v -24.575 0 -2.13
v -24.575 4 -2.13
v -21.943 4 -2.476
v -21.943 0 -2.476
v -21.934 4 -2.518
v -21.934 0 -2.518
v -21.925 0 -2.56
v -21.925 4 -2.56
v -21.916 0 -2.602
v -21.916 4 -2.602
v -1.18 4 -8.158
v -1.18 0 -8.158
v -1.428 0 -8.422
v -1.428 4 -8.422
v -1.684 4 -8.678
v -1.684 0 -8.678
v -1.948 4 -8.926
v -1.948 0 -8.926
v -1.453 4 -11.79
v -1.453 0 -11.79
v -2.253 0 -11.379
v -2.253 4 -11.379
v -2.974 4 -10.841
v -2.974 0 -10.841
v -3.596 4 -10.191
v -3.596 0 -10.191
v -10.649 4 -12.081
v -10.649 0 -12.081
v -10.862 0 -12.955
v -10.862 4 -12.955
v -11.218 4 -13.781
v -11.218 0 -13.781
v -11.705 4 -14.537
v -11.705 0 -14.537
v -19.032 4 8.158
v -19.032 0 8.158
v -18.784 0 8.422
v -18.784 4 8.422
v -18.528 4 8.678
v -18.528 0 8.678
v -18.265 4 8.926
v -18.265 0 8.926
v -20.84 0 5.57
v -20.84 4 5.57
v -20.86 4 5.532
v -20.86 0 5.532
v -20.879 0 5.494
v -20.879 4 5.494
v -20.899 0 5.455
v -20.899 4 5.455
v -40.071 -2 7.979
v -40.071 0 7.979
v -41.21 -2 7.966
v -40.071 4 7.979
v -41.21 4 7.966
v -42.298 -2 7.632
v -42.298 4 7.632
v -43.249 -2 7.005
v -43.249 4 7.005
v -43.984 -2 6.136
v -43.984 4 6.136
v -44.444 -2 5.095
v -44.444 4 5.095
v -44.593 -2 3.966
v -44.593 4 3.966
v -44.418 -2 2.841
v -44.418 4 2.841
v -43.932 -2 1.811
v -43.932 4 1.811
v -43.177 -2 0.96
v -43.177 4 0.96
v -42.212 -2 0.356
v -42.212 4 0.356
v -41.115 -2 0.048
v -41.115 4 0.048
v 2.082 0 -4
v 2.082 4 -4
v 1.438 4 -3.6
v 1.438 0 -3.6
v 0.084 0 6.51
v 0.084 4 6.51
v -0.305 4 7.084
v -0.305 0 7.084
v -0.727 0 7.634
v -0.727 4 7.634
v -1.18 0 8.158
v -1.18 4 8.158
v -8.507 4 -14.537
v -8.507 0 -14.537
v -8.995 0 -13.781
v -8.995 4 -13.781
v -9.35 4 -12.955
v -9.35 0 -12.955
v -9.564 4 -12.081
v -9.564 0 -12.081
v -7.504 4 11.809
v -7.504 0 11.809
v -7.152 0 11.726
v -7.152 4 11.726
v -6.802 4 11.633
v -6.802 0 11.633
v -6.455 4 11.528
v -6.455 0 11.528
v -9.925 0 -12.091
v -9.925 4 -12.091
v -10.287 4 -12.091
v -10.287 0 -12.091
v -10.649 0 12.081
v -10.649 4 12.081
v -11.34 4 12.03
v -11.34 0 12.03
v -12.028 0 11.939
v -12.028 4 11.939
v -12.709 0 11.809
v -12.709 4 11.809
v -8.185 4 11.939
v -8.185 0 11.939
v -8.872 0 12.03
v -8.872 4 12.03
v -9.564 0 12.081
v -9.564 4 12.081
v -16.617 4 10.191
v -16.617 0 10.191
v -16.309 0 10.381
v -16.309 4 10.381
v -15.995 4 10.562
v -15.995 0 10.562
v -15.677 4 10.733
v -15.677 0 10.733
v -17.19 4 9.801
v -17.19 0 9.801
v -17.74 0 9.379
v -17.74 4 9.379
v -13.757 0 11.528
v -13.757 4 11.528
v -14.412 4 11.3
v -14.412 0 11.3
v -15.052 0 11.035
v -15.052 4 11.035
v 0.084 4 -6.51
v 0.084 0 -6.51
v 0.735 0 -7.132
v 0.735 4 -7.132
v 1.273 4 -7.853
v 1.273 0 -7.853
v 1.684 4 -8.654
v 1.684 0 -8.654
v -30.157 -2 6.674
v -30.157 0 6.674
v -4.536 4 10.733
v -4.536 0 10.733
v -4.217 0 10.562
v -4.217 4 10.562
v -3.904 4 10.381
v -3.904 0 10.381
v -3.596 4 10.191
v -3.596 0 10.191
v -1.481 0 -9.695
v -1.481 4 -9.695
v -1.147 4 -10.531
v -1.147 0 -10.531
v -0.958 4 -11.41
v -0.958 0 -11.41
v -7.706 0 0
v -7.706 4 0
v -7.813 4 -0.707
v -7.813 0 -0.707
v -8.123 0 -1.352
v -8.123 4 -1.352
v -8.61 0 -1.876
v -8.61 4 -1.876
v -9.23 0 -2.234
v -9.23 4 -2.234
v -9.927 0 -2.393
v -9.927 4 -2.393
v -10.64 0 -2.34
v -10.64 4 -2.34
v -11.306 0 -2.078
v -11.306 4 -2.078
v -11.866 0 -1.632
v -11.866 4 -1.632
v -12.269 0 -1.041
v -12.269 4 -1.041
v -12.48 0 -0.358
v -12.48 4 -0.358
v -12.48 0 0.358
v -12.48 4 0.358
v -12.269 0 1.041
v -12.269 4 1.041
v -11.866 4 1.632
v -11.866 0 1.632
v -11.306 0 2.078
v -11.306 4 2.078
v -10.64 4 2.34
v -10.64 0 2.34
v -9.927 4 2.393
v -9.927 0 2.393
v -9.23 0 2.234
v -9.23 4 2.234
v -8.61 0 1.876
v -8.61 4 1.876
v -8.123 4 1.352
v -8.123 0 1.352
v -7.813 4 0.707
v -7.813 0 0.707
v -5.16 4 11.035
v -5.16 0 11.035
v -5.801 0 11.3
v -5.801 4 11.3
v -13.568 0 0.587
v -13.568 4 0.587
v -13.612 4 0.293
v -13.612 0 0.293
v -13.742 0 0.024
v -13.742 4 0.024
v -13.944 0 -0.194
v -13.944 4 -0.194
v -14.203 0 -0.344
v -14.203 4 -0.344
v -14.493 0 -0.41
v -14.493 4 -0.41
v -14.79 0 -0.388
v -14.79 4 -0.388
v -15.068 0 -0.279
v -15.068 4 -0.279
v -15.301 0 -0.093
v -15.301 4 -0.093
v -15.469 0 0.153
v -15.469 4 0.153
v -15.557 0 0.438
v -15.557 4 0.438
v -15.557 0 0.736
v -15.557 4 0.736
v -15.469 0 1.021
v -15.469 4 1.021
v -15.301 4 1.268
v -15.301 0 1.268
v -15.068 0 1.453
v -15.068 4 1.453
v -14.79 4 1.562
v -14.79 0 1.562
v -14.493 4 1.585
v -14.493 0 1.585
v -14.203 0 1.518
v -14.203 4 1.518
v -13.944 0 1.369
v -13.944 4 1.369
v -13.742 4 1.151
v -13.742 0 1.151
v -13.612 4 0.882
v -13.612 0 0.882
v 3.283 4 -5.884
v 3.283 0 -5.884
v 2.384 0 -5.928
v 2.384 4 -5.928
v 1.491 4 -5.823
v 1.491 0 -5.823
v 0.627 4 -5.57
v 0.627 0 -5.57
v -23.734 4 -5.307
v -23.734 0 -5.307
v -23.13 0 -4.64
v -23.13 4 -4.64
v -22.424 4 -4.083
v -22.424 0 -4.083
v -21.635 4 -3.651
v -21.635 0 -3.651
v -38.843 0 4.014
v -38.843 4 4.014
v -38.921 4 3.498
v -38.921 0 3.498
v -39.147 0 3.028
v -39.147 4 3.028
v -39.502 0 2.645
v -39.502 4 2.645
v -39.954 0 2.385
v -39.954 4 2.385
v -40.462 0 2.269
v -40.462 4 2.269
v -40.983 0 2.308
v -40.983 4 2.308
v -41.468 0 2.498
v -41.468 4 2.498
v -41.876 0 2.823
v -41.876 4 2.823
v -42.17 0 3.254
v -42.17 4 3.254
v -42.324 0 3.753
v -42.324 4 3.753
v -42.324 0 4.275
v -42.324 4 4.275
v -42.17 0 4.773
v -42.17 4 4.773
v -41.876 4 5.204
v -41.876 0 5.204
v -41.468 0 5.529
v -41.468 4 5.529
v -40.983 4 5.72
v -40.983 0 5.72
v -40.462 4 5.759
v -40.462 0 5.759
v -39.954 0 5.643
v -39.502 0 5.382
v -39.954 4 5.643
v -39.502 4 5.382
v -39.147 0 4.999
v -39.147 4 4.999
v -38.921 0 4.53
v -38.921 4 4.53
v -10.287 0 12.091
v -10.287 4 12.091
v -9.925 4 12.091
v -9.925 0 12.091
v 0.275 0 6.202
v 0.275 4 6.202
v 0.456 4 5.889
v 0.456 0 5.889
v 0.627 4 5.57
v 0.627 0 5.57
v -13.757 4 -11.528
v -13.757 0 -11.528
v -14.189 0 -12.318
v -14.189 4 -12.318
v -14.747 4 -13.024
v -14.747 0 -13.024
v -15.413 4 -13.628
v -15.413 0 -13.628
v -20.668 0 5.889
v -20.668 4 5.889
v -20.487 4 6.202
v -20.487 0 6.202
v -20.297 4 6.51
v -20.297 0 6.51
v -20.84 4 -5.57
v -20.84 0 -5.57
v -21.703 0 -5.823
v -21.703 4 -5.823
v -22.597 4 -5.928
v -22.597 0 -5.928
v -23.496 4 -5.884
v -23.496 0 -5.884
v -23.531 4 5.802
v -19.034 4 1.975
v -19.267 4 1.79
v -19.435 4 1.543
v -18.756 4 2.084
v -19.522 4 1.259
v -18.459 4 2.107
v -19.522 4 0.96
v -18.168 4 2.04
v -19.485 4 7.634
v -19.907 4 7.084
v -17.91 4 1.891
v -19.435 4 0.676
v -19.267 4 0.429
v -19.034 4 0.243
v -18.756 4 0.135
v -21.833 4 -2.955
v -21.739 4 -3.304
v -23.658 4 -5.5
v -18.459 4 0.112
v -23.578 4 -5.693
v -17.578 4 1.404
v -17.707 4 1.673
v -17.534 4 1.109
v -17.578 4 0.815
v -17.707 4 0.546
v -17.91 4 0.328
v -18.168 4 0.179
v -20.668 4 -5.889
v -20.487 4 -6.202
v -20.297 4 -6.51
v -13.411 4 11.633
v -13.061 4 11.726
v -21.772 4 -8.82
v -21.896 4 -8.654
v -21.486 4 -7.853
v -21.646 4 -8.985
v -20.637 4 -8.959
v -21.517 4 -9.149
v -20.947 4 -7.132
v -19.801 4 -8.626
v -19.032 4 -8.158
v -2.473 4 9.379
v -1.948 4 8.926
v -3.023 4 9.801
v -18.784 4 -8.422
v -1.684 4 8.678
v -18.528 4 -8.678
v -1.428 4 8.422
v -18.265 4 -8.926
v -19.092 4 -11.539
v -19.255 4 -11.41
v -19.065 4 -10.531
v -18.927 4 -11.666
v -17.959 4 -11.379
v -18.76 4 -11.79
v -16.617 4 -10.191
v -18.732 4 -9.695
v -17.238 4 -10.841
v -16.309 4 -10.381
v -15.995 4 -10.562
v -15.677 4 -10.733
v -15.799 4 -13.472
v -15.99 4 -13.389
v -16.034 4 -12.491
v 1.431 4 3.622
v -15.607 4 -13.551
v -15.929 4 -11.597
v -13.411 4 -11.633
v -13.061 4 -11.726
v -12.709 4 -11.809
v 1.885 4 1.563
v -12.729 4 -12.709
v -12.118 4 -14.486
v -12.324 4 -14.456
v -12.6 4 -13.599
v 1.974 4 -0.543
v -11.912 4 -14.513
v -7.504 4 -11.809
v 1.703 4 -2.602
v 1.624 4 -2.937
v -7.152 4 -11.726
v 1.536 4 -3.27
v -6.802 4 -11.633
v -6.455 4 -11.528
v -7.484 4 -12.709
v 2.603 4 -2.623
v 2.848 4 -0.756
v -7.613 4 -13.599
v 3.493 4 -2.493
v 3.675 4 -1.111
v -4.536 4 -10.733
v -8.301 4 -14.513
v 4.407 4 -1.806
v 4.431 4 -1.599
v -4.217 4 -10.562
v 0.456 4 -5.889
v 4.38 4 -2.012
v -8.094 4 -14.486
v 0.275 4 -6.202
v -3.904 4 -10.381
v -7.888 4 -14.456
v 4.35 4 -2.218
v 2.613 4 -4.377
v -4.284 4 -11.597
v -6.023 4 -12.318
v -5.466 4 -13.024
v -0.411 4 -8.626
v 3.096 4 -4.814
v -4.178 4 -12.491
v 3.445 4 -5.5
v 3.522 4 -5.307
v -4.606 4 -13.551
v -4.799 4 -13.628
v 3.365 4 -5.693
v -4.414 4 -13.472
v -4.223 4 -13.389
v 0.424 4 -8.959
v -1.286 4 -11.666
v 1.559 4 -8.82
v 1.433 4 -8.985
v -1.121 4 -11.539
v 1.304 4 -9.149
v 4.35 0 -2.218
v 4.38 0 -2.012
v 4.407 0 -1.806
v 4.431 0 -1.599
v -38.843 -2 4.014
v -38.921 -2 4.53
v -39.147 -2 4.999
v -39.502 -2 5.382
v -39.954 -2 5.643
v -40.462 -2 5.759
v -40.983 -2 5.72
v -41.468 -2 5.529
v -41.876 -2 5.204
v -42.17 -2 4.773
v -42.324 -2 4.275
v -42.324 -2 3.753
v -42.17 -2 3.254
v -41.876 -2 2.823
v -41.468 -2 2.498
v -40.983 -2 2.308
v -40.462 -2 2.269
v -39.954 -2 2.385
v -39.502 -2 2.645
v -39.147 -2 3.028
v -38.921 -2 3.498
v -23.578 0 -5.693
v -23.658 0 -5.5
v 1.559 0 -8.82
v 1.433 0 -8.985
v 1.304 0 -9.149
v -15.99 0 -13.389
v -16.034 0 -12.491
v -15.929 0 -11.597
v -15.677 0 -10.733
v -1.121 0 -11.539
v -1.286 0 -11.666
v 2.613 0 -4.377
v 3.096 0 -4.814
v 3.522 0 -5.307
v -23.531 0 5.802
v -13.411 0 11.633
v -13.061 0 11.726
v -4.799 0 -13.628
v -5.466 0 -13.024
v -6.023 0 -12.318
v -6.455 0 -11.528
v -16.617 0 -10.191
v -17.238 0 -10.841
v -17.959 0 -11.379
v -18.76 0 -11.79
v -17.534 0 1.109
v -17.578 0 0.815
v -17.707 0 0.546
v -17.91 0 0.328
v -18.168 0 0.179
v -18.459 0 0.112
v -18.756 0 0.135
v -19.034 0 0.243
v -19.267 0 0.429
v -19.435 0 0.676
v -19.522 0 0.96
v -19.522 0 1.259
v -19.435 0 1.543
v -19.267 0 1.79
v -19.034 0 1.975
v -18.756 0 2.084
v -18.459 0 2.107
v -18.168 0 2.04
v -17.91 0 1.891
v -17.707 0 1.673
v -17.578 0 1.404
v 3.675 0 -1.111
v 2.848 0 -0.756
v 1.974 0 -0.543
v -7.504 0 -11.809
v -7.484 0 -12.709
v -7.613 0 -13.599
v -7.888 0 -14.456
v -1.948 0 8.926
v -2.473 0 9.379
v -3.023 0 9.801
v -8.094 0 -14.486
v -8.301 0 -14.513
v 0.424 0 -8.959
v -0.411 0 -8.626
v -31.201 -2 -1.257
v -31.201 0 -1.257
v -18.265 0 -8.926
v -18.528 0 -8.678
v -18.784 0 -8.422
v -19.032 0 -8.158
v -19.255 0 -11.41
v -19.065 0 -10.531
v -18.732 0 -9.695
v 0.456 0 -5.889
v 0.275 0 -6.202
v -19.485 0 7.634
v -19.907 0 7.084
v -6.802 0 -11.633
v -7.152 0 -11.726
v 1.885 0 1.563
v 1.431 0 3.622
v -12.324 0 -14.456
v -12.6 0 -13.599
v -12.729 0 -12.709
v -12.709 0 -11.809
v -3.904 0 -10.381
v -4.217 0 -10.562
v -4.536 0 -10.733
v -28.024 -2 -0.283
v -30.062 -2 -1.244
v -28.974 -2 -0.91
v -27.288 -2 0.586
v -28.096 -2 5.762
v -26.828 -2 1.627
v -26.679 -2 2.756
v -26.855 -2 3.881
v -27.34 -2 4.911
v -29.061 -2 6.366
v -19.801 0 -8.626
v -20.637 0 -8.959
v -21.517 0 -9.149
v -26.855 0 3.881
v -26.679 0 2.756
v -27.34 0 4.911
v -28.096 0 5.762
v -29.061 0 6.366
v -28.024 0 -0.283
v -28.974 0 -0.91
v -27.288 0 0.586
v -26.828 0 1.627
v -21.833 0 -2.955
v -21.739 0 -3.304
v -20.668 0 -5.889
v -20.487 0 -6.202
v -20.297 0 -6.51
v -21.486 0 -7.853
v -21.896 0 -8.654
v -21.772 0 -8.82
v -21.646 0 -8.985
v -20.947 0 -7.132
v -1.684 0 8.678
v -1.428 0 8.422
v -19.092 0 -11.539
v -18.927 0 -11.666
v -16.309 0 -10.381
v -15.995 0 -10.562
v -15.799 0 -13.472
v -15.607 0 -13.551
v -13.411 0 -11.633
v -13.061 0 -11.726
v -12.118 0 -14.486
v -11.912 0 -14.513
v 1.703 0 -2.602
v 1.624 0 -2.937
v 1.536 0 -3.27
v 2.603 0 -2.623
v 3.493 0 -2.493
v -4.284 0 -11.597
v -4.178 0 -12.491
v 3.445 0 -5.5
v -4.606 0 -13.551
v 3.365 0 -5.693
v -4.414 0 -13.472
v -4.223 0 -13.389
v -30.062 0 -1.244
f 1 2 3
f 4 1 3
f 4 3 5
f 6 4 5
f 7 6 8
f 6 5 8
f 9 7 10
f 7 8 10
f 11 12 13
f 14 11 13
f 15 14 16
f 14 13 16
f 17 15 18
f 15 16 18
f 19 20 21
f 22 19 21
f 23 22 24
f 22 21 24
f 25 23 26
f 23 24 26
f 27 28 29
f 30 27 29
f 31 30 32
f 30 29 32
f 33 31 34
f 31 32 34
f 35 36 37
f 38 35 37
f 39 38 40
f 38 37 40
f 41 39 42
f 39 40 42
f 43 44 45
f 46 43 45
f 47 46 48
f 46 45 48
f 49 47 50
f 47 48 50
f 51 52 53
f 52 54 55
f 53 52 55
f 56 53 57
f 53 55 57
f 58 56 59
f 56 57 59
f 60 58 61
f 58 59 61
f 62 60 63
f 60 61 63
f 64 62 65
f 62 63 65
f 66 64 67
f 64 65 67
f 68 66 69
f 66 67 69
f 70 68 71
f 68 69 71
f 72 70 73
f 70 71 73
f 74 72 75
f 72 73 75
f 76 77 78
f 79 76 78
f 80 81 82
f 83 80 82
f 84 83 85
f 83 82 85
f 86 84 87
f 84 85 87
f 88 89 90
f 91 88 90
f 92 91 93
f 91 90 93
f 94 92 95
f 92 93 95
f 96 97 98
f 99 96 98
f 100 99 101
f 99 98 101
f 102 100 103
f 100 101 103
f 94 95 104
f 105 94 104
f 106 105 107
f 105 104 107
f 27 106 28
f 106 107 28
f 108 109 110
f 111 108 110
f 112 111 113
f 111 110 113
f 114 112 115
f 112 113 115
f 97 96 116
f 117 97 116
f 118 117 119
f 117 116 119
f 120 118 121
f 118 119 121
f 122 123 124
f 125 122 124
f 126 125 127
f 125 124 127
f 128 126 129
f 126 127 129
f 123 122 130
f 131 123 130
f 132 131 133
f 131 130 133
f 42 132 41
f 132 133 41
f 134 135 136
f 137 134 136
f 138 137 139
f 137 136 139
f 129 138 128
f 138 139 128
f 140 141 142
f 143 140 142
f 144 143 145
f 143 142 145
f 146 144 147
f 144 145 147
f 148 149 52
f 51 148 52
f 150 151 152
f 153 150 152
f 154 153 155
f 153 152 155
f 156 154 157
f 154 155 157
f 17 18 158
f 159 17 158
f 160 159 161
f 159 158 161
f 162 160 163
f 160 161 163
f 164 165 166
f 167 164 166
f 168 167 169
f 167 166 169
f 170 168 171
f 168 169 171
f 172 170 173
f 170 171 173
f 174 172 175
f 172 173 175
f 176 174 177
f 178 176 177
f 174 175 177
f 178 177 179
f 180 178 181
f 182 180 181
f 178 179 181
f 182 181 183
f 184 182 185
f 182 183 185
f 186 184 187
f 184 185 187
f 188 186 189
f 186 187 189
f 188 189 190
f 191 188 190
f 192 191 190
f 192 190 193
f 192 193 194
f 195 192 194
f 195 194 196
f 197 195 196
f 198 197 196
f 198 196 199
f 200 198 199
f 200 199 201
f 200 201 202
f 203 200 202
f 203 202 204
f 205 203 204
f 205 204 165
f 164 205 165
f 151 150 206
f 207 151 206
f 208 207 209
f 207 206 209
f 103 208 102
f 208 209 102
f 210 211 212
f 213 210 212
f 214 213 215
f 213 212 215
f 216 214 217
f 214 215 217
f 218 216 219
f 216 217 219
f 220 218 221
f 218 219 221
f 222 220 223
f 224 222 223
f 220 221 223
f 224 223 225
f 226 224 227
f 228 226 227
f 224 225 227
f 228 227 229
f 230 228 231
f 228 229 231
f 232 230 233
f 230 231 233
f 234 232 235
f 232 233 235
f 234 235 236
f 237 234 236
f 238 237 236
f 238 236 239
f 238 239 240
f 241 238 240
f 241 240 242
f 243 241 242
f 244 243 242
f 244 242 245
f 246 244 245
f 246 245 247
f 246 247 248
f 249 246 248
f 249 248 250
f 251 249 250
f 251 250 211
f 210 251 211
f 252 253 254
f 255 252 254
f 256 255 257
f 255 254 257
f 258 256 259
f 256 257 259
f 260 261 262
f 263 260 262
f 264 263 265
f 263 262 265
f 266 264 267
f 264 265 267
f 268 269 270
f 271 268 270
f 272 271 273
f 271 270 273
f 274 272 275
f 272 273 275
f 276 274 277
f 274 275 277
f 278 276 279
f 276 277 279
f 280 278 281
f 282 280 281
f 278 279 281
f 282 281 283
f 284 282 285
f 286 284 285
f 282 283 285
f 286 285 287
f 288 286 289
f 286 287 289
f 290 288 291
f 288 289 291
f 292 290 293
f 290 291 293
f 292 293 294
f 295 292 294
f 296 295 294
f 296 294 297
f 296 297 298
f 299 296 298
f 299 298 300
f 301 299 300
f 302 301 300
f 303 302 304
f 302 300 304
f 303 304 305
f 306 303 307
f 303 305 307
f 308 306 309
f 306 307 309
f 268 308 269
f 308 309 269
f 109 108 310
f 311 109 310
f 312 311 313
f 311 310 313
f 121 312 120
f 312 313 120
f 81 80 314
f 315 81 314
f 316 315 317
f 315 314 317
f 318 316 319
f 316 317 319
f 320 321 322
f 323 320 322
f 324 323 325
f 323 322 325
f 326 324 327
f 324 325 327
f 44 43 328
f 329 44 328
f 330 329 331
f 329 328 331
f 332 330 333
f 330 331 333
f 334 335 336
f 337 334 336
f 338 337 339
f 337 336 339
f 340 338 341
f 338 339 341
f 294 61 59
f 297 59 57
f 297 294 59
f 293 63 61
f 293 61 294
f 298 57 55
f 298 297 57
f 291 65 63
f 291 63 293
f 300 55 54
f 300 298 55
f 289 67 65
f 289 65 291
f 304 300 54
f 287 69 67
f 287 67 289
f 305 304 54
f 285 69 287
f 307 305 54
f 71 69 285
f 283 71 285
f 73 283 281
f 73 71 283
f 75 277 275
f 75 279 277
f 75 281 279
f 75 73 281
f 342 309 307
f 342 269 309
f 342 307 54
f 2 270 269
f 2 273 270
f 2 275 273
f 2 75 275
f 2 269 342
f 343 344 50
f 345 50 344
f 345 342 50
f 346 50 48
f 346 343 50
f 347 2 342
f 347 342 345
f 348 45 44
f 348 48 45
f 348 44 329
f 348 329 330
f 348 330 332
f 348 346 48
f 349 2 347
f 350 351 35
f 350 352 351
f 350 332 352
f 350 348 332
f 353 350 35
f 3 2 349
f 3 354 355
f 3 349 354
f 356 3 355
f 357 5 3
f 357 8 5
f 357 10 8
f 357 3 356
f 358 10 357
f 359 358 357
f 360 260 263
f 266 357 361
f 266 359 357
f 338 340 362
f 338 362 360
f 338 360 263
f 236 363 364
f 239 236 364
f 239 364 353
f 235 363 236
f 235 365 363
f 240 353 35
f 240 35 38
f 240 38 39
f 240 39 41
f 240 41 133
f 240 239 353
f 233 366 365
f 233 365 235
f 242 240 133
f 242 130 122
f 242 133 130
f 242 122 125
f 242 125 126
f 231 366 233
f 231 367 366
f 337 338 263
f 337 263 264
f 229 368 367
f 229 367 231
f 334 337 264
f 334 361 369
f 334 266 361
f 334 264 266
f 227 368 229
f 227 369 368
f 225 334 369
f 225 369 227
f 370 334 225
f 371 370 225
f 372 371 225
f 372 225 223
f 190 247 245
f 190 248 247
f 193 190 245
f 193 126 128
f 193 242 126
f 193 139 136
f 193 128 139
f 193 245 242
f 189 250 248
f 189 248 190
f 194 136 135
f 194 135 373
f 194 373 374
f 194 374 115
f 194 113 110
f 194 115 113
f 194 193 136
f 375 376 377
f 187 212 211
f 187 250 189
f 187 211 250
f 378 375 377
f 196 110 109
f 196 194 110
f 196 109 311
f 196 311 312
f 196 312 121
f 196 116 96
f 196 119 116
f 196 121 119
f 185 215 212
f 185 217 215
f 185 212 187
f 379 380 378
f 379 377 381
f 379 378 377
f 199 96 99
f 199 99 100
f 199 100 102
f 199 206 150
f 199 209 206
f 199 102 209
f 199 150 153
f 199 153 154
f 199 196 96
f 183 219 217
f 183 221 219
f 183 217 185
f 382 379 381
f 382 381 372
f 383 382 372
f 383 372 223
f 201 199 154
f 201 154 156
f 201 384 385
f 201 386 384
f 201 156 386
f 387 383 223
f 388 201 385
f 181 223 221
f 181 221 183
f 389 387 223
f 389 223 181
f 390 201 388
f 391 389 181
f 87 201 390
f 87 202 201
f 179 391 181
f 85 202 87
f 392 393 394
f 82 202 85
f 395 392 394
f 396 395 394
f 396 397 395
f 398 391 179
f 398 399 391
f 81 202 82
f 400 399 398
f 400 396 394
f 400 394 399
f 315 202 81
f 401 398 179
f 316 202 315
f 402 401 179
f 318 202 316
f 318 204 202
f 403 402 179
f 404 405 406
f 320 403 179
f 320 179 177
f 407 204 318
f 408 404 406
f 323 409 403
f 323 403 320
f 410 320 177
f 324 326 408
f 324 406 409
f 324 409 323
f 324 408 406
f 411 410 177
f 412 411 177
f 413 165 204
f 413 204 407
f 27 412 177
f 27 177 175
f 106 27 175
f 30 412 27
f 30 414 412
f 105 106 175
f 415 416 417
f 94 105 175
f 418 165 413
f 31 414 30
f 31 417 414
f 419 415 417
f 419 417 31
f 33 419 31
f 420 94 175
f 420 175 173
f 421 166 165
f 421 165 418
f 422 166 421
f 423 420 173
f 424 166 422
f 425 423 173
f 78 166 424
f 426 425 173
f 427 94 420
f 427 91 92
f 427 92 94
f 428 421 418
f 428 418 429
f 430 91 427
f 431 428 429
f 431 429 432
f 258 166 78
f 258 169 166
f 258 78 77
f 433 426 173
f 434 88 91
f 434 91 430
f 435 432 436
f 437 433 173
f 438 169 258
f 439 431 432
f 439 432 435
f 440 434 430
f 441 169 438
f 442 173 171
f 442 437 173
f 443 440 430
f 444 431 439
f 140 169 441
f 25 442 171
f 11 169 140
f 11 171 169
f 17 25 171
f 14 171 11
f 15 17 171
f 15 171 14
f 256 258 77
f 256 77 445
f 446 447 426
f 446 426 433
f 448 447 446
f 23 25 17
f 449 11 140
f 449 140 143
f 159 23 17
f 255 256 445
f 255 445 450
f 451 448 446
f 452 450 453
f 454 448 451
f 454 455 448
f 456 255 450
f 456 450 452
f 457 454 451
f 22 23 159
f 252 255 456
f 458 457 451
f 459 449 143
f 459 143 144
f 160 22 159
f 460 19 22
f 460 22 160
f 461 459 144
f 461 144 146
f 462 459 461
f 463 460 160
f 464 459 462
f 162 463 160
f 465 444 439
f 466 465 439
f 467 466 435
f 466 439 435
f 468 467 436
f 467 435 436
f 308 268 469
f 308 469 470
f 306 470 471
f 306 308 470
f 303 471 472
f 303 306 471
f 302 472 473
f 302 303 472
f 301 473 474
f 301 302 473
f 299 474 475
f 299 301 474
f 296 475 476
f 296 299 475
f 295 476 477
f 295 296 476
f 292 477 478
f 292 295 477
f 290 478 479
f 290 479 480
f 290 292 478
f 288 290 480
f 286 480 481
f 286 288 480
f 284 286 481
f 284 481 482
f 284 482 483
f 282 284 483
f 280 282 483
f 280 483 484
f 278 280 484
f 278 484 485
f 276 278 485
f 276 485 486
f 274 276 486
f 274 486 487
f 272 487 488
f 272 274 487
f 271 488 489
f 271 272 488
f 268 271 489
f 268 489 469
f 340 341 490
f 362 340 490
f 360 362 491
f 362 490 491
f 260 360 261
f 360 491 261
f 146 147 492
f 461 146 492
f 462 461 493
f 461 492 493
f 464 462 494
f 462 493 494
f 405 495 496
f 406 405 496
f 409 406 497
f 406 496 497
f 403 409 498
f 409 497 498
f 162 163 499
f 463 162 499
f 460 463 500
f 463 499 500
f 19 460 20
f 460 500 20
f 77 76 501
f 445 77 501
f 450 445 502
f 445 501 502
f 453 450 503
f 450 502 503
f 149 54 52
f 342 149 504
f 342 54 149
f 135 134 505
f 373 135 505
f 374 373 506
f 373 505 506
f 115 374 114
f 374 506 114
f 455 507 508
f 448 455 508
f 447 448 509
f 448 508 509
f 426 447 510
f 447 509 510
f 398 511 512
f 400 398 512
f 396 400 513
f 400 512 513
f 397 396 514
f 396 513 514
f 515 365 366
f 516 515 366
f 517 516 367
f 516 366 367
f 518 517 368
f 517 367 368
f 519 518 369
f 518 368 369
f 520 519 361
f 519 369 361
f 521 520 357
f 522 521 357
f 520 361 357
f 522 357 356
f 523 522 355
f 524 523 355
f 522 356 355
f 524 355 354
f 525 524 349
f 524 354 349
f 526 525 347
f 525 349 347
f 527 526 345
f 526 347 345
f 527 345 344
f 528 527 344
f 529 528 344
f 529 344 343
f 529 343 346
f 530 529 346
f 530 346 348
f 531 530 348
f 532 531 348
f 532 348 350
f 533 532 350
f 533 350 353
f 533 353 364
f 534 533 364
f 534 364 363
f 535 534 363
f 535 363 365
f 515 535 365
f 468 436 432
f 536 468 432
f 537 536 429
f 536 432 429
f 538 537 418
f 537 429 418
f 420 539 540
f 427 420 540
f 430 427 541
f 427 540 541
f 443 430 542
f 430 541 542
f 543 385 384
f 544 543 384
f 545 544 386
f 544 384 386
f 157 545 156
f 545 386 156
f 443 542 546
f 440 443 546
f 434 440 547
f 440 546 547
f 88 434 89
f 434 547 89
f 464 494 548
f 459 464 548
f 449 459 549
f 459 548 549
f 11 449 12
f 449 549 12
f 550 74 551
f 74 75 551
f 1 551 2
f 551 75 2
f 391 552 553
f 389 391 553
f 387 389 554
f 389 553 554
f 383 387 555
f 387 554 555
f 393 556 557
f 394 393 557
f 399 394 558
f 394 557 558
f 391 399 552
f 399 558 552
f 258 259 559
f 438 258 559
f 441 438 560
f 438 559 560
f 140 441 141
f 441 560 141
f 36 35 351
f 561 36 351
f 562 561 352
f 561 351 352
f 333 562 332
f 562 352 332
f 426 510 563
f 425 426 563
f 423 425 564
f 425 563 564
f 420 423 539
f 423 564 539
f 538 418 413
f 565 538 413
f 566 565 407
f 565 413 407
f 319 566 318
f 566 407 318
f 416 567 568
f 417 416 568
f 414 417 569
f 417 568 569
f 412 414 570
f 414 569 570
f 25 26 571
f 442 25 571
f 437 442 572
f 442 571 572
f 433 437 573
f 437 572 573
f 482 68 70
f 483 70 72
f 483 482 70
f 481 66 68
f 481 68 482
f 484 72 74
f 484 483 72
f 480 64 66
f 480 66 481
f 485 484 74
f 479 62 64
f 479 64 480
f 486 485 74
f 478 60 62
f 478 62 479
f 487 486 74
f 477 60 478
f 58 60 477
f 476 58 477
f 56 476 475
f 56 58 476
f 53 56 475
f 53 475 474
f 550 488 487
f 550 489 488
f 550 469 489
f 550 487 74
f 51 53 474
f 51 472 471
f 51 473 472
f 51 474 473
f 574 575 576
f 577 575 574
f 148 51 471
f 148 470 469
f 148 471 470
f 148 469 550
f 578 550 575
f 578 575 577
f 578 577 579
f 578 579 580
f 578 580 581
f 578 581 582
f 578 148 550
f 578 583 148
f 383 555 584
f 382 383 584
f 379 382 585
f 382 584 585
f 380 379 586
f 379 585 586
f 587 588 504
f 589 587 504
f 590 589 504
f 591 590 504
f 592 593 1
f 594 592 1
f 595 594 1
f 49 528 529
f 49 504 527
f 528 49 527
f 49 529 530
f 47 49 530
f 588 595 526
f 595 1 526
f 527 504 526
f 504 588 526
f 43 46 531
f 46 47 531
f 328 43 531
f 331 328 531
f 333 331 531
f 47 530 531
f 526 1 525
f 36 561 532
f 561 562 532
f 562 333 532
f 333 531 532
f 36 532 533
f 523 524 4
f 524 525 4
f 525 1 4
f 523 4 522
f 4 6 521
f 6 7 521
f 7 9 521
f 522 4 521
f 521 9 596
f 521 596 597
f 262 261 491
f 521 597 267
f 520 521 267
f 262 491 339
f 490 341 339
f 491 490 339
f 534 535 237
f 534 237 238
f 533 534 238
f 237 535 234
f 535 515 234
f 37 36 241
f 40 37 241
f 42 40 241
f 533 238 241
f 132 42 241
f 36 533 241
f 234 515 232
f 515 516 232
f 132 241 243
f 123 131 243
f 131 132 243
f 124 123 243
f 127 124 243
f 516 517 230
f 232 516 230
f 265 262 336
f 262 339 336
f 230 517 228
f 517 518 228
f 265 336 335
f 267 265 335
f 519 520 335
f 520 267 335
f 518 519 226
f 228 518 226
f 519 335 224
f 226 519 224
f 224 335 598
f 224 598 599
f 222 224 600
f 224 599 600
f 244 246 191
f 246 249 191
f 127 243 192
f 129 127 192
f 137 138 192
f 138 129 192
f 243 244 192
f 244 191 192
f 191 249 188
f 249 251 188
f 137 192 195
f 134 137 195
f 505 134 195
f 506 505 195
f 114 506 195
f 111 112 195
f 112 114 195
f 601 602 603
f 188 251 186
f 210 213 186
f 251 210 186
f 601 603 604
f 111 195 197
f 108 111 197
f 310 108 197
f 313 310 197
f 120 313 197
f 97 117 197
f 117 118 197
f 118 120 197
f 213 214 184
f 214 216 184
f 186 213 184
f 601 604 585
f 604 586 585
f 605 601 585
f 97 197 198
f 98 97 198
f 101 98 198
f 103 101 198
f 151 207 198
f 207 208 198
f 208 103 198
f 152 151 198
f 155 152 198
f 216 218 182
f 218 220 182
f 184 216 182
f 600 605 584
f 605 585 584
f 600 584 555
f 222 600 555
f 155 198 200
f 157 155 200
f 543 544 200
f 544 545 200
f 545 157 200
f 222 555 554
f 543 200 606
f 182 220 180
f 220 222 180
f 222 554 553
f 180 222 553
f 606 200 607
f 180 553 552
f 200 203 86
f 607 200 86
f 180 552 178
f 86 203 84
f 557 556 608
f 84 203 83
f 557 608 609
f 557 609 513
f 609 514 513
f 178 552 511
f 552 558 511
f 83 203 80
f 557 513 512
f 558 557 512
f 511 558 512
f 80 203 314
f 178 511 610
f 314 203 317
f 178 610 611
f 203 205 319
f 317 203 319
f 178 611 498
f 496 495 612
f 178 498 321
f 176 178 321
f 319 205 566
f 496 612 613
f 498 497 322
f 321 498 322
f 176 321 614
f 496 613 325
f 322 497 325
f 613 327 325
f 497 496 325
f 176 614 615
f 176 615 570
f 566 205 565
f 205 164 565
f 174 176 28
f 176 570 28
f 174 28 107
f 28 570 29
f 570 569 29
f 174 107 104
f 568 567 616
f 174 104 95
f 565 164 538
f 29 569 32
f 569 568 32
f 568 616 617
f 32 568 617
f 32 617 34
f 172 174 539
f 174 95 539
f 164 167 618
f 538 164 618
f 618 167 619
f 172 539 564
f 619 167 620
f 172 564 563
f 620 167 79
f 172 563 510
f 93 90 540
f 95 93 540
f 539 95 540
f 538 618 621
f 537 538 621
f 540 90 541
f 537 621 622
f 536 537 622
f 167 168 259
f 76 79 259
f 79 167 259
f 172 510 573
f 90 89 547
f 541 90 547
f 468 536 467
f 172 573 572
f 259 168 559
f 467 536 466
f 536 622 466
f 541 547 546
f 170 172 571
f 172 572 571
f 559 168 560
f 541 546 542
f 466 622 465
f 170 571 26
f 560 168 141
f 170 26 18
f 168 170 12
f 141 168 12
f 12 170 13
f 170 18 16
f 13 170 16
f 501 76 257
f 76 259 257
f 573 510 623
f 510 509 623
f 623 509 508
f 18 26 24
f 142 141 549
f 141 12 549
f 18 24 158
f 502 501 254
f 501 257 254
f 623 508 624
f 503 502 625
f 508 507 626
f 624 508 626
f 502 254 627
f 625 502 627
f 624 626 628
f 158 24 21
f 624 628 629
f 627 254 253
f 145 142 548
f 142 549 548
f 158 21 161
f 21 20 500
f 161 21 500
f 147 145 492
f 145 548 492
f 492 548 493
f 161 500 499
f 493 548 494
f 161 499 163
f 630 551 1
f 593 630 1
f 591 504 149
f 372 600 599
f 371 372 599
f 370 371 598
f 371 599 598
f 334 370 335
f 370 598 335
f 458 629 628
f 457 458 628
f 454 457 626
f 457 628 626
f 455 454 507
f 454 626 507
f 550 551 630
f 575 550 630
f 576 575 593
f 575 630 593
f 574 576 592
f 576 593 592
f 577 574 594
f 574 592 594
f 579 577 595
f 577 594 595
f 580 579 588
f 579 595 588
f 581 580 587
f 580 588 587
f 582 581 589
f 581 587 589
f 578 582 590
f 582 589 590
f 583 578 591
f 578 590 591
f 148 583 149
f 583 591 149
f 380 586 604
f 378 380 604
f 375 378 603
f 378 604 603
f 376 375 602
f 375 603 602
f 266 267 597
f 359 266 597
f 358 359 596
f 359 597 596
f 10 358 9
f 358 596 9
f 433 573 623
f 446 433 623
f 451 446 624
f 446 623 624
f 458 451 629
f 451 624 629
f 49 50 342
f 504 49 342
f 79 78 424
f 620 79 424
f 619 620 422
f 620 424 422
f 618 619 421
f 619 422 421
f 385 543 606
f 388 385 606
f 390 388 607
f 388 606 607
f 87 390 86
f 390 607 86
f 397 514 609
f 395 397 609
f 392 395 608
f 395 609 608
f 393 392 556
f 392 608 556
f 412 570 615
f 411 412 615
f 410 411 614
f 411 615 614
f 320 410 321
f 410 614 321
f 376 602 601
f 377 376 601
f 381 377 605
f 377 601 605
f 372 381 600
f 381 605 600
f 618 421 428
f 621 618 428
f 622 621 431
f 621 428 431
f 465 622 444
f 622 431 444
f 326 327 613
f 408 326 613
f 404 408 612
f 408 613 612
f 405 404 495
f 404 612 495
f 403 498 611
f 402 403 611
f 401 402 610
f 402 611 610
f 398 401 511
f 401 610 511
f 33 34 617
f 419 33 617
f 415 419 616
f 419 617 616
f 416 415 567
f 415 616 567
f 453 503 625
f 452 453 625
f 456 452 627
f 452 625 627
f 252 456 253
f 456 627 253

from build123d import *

# Parameters (mm, degrees)
SKETCH1_R           = 1.5
BOSS_EXTRUDE1_DEPTH = 4
SKETCH3_R           = 1.75
BOSS_EXTRUDE2_DEPTH = 4
CUT_EXTRUDE1_DEPTH  = 4
CUT_EXTRUDE2_REACH  = 6
SKETCH5_R           = 2.4
SKETCH5_R_2         = 1
SKETCH8_R           = 1.75
BOSS_EXTRUDE3_DEPTH = 2


with BuildPart() as part:
    # Sketch1 → Boss-Extrude1 (new body)
    with BuildSketch(Plane(origin=(0, 0, 0), x_dir=(1, 0, 0), z_dir=(0, 1, 0))):
        with BuildLine():
            Line((20.643657446, 4), (2.081641936, 4))
            ThreePointArc((2.081641936, 4), (2.861028333, 4.588201733), (3.521749436, 5.30713988))
            ThreePointArc((3.521749436, 5.30713988), (3.405395609, 5.596745198), (3.282888305, 5.883801663))
            ThreePointArc((3.282888305, 5.883801663), (1.93527598, 5.894040025), (0.627094961, 5.57027124))
            ThreePointArc((0.627094961, 5.57027124), (0.366286148, 6.046375), (0.084372603, 6.510293938))
            ThreePointArc((0.084372603, 6.510293938), (1.018855105, 7.48132754), (1.683794586, 8.65351323))
            ThreePointArc((1.683794586, 8.65351323), (1.496450048, 8.903135899), (1.303821399, 9.148703928))
            ThreePointArc((1.303821399, 9.148703928), (-0.000522033, 8.809805691), (-1.180330337, 8.158486898))
            ThreePointArc((-1.180330337, 8.158486898), (-1.555477026, 8.550865528), (-1.947855656, 8.926012217))
            ThreePointArc((-1.947855656, 8.926012217), (-1.296536862, 10.105820521), (-0.957638625, 11.410163953))
            ThreePointArc((-0.957638625, 11.410163953), (-1.203206655, 11.602792602), (-1.452829324, 11.79013714))
            ThreePointArc((-1.452829324, 11.79013714), (-2.625015014, 11.125197659), (-3.596048616, 10.190715157))
            ThreePointArc((-3.596048616, 10.190715157), (-4.059967554, 10.472628702), (-4.536071314, 10.733437515))
            ThreePointArc((-4.536071314, 10.733437515), (-4.212302529, 12.041618533), (-4.222540891, 13.389230859))
            ThreePointArc((-4.222540891, 13.389230859), (-4.509597355, 13.511738163), (-4.799202674, 13.62809199))
            ThreePointArc((-4.799202674, 13.62809199), (-5.759348103, 12.682425791), (-6.455432668, 11.528463019))
            ThreePointArc((-6.455432668, 11.528463019), (-6.976508546, 11.680699536), (-7.503891752, 11.809396783))
            ThreePointArc((-7.503891752, 11.809396783), (-7.529737283, 13.156800143), (-7.888414517, 14.455843809))
            ThreePointArc((-7.888414517, 14.455843809), (-8.197396993, 14.499881098), (-8.507248835, 14.537314892))
            ThreePointArc((-8.507248835, 14.537314892), (-9.18992168, 13.375367565), (-9.563620196, 12.080565177))
            ThreePointArc((-9.563620196, 12.080565177), (-10.106342554, 12.09275), (-10.649064912, 12.080565177))
            ThreePointArc((-10.649064912, 12.080565177), (-11.022763428, 13.375367565), (-11.705436272, 14.537314892))
            ThreePointArc((-11.705436272, 14.537314892), (-12.015288115, 14.499881098), (-12.324270591, 14.455843809))
            ThreePointArc((-12.324270591, 14.455843809), (-12.682947825, 13.156800143), (-12.708793355, 11.809396783))
            ThreePointArc((-12.708793355, 11.809396783), (-13.236176561, 11.680699536), (-13.757252439, 11.528463019))
            ThreePointArc((-13.757252439, 11.528463019), (-14.453337005, 12.682425791), (-15.413482434, 13.62809199))
            ThreePointArc((-15.413482434, 13.62809199), (-15.703087752, 13.511738163), (-15.990144217, 13.389230859))
            ThreePointArc((-15.990144217, 13.389230859), (-16.000382579, 12.041618533), (-15.676613793, 10.733437515))
            ThreePointArc((-15.676613793, 10.733437515), (-16.152717554, 10.472628702), (-16.616636492, 10.190715157))
            ThreePointArc((-16.616636492, 10.190715157), (-17.587670094, 11.125197659), (-18.759855783, 11.79013714))
            ThreePointArc((-18.759855783, 11.79013714), (-19.009478453, 11.602792602), (-19.255046482, 11.410163953))
            ThreePointArc((-19.255046482, 11.410163953), (-18.916148245, 10.105820521), (-18.264829452, 8.926012217))
            ThreePointArc((-18.264829452, 8.926012217), (-18.657208082, 8.550865528), (-19.032354771, 8.158486898))
            ThreePointArc((-19.032354771, 8.158486898), (-20.212163074, 8.809805691), (-21.516506507, 9.148703928))
            ThreePointArc((-21.516506507, 9.148703928), (-21.709135156, 8.903135899), (-21.896479694, 8.65351323))
            ThreePointArc((-21.896479694, 8.65351323), (-21.231540213, 7.48132754), (-20.297057711, 6.510293938))
            ThreePointArc((-20.297057711, 6.510293938), (-20.578971255, 6.046375), (-20.839780068, 5.57027124))
            ThreePointArc((-20.839780068, 5.57027124), (-22.147961087, 5.894040025), (-23.495573413, 5.883801663))
            ThreePointArc((-23.495573413, 5.883801663), (-23.618080717, 5.596745198), (-23.734434544, 5.30713988))
            ThreePointArc((-23.734434544, 5.30713988), (-22.788768345, 4.346994451), (-21.634805572, 3.650909885))
            ThreePointArc((-21.634805572, 3.650909885), (-21.78704209, 3.129834008), (-21.915739337, 2.602450802))
            ThreePointArc((-21.915739337, 2.602450802), (-23.263142697, 2.576605271), (-24.562186363, 2.217928037))
            ThreePointArc((-24.562186363, 2.217928037), (-24.606223651, 1.908945561), (-24.643657446, 1.599093719))
            ThreePointArc((-24.643657446, 1.599093719), (-23.481710119, 0.916420874), (-22.186907731, 0.542722358))
            ThreePointArc((-22.186907731, 0.542722358), (-22.199092554, 0), (-22.186907731, -0.542722358))
            ThreePointArc((-22.186907731, -0.542722358), (-23.481710119, -0.916420874), (-24.643657446, -1.599093719))
            ThreePointArc((-24.643657446, -1.599093719), (-24.606223651, -1.908945561), (-24.562186363, -2.217928037))
            ThreePointArc((-24.562186363, -2.217928037), (-23.263142697, -2.576605271), (-21.915739337, -2.602450802))
            ThreePointArc((-21.915739337, -2.602450802), (-21.78704209, -3.129834008), (-21.634805572, -3.650909885))
            ThreePointArc((-21.634805572, -3.650909885), (-22.788768345, -4.346994451), (-23.734434544, -5.30713988))
            ThreePointArc((-23.734434544, -5.30713988), (-23.618080717, -5.596745198), (-23.495573413, -5.883801663))
            ThreePointArc((-23.495573413, -5.883801663), (-22.147961087, -5.894040025), (-20.839780068, -5.57027124))
            ThreePointArc((-20.839780068, -5.57027124), (-20.578971255, -6.046375), (-20.297057711, -6.510293938))
            ThreePointArc((-20.297057711, -6.510293938), (-21.231540213, -7.48132754), (-21.896479694, -8.65351323))
            ThreePointArc((-21.896479694, -8.65351323), (-21.709135156, -8.903135899), (-21.516506507, -9.148703928))
            ThreePointArc((-21.516506507, -9.148703928), (-20.212163074, -8.809805691), (-19.032354771, -8.158486898))
            ThreePointArc((-19.032354771, -8.158486898), (-18.657208082, -8.550865528), (-18.264829452, -8.926012217))
            ThreePointArc((-18.264829452, -8.926012217), (-18.916148245, -10.105820521), (-19.255046482, -11.410163953))
            ThreePointArc((-19.255046482, -11.410163953), (-19.009478453, -11.602792602), (-18.759855783, -11.79013714))
            ThreePointArc((-18.759855783, -11.79013714), (-17.587670094, -11.125197659), (-16.616636492, -10.190715157))
            ThreePointArc((-16.616636492, -10.190715157), (-16.152717554, -10.472628702), (-15.676613793, -10.733437515))
            ThreePointArc((-15.676613793, -10.733437515), (-16.000382579, -12.041618533), (-15.990144217, -13.389230859))
            ThreePointArc((-15.990144217, -13.389230859), (-15.703087752, -13.511738163), (-15.413482434, -13.62809199))
            ThreePointArc((-15.413482434, -13.62809199), (-14.453337005, -12.682425791), (-13.757252439, -11.528463019))
            ThreePointArc((-13.757252439, -11.528463019), (-13.236176561, -11.680699536), (-12.708793355, -11.809396783))
            ThreePointArc((-12.708793355, -11.809396783), (-12.682947825, -13.156800143), (-12.324270591, -14.455843809))
            ThreePointArc((-12.324270591, -14.455843809), (-12.015288115, -14.499881098), (-11.705436272, -14.537314892))
            ThreePointArc((-11.705436272, -14.537314892), (-11.022763428, -13.375367565), (-10.649064912, -12.080565177))
            ThreePointArc((-10.649064912, -12.080565177), (-10.106342554, -12.09275), (-9.563620196, -12.080565177))
            ThreePointArc((-9.563620196, -12.080565177), (-9.18992168, -13.375367565), (-8.507248835, -14.537314892))
            ThreePointArc((-8.507248835, -14.537314892), (-8.197396993, -14.499881098), (-7.888414517, -14.455843809))
            ThreePointArc((-7.888414517, -14.455843809), (-7.529737283, -13.156800143), (-7.503891752, -11.809396783))
            ThreePointArc((-7.503891752, -11.809396783), (-6.976508546, -11.680699536), (-6.455432668, -11.528463019))
            ThreePointArc((-6.455432668, -11.528463019), (-5.759348103, -12.682425791), (-4.799202674, -13.62809199))
            ThreePointArc((-4.799202674, -13.62809199), (-4.509597355, -13.511738163), (-4.222540891, -13.389230859))
            ThreePointArc((-4.222540891, -13.389230859), (-4.212302529, -12.041618533), (-4.536071314, -10.733437515))
            ThreePointArc((-4.536071314, -10.733437515), (-4.059967554, -10.472628702), (-3.596048616, -10.190715157))
            ThreePointArc((-3.596048616, -10.190715157), (-2.625015014, -11.125197659), (-1.452829324, -11.79013714))
            ThreePointArc((-1.452829324, -11.79013714), (-1.203206655, -11.602792602), (-0.957638625, -11.410163953))
            ThreePointArc((-0.957638625, -11.410163953), (-1.296536862, -10.105820521), (-1.947855656, -8.926012217))
            ThreePointArc((-1.947855656, -8.926012217), (-1.555477026, -8.550865528), (-1.180330337, -8.158486898))
            ThreePointArc((-1.180330337, -8.158486898), (-0.000522033, -8.809805691), (1.303821399, -9.148703928))
            ThreePointArc((1.303821399, -9.148703928), (1.496450048, -8.903135899), (1.683794586, -8.65351323))
            ThreePointArc((1.683794586, -8.65351323), (1.018855105, -7.48132754), (0.084372603, -6.510293938))
            ThreePointArc((0.084372603, -6.510293938), (0.366286148, -6.046375), (0.627094961, -5.57027124))
            ThreePointArc((0.627094961, -5.57027124), (1.93527598, -5.894040025), (3.282888305, -5.883801663))
            ThreePointArc((3.282888305, -5.883801663), (3.405395609, -5.596745198), (3.521749436, -5.30713988))
            ThreePointArc((3.521749436, -5.30713988), (2.861028333, -4.588201733), (2.081641936, -4))
            Line((2.081641936, -4), (20.643657446, -4))
            ThreePointArc((20.643657446, -4), (24.643657446, 0), (20.643657446, 4))
        make_face()
        with Locations((-10.106342554, 0)):
            Circle(SKETCH1_R, mode=Mode.SUBTRACT)
        with Locations((20.643657446, 0)):
            Circle(SKETCH1_R, mode=Mode.SUBTRACT)
    extrude(amount=BOSS_EXTRUDE1_DEPTH)

    # Sketch3 → Boss-Extrude2 (add)
    with BuildSketch(Plane(origin=(0, 4, 0), x_dir=(1, 0, 0), z_dir=(0, 1, 0))):
        with BuildLine():
            ThreePointArc((-9.584237785, -3.965779445), (-14.072121999, -0.522104769), (-10.628447323, 3.965779445))
            Line((-10.628447323, 3.965779445), (-41.11537681, -0.047900965))
            ThreePointArc((-41.11537681, -0.047900965), (-44.559051487, -4.53578518), (-40.071167272, -7.979459856))
            Line((-40.071167272, -7.979459856), (-9.584237785, -3.965779445))
        make_face()
        with Locations((-40.593272041, -4.013680411)):
            Circle(SKETCH3_R, mode=Mode.SUBTRACT)
    extrude(amount=-BOSS_EXTRUDE2_DEPTH)

    # Sketch4 → Cut-Extrude1 (cut)
    with BuildSketch(Plane(origin=(0, 4, 0), x_dir=(1, 0, 0), z_dir=(0, 1, 0))):
        with BuildLine():
            ThreePointArc((20.643657446, -4), (24.643657446, 0), (20.643657446, 4))
            Line((20.643657446, 4), (2.081641936, 4))
            Line((2.081641936, 4), (1.43808022, 3.600125745))
            ThreePointArc((1.43808022, 3.600125745), (1.581217534, 3.104116905), (1.70305423, 2.602450802))
            ThreePointArc((1.70305423, 2.602450802), (3.050457589, 2.576605271), (4.349501255, 2.217928037))
            ThreePointArc((4.349501255, 2.217928037), (4.393538544, 1.908945561), (4.430972339, 1.599093719))
            ThreePointArc((4.430972339, 1.599093719), (3.269025011, 0.916420874), (1.974222624, 0.542722358))
            ThreePointArc((1.974222624, 0.542722358), (1.70305423, -2.602450802), (0.627094961, -5.57027124))
            ThreePointArc((0.627094961, -5.57027124), (1.93527598, -5.894040025), (3.282888305, -5.883801663))
            ThreePointArc((3.282888305, -5.883801663), (3.405395609, -5.596745198), (3.521749436, -5.30713988))
            ThreePointArc((3.521749436, -5.30713988), (2.861028333, -4.588201733), (2.081641936, -4))
            Line((2.081641936, -4), (20.643657446, -4))
        make_face()
        with BuildLine():
            ThreePointArc((1.683794586, -8.65351323), (1.018855105, -7.48132754), (0.084372603, -6.510293938))
            ThreePointArc((0.084372603, -6.510293938), (-0.512518948, -7.361599771), (-1.180330337, -8.158486898))
            ThreePointArc((-1.180330337, -8.158486898), (-0.000522033, -8.809805691), (1.303821399, -9.148703928))
            ThreePointArc((1.303821399, -9.148703928), (1.496450048, -8.903135899), (1.683794586, -8.65351323))
        make_face()
        with BuildLine():
            ThreePointArc((-0.957638625, -11.410163953), (-1.296536862, -10.105820521), (-1.947855656, -8.926012217))
            ThreePointArc((-1.947855656, -8.926012217), (-2.744742783, -9.593823606), (-3.596048616, -10.190715157))
            ThreePointArc((-3.596048616, -10.190715157), (-2.625015014, -11.125197659), (-1.452829324, -11.79013714))
            ThreePointArc((-1.452829324, -11.79013714), (-1.203206655, -11.602792602), (-0.957638625, -11.410163953))
        make_face()
        with BuildLine():
            ThreePointArc((-4.222540891, -13.389230859), (-4.212302529, -12.041618533), (-4.536071314, -10.733437515))
            ThreePointArc((-4.536071314, -10.733437515), (-5.478647477, -11.172244217), (-6.455432668, -11.528463019))
            ThreePointArc((-6.455432668, -11.528463019), (-5.759348103, -12.682425791), (-4.799202674, -13.62809199))
            ThreePointArc((-4.799202674, -13.62809199), (-4.509597355, -13.511738163), (-4.222540891, -13.389230859))
        make_face()
        with BuildLine():
            ThreePointArc((-7.888414517, -14.455843809), (-7.529737283, -13.156800143), (-7.503891752, -11.809396783))
            ThreePointArc((-7.503891752, -11.809396783), (-8.527921943, -11.989294847), (-9.563620196, -12.080565177))
            ThreePointArc((-9.563620196, -12.080565177), (-9.18992168, -13.375367565), (-8.507248835, -14.537314892))
            ThreePointArc((-8.507248835, -14.537314892), (-8.197396993, -14.499881098), (-7.888414517, -14.455843809))
        make_face()
        with BuildLine():
            ThreePointArc((-11.705436272, -14.537314892), (-11.022763428, -13.375367565), (-10.649064912, -12.080565177))
            ThreePointArc((-10.649064912, -12.080565177), (-11.684763165, -11.989294847), (-12.708793355, -11.809396783))
            ThreePointArc((-12.708793355, -11.809396783), (-12.682947825, -13.156800143), (-12.324270591, -14.455843809))
            ThreePointArc((-12.324270591, -14.455843809), (-12.015288115, -14.499881098), (-11.705436272, -14.537314892))
        make_face()
        with BuildLine():
            ThreePointArc((-15.413482434, -13.62809199), (-14.453337005, -12.682425791), (-13.757252439, -11.528463019))
            ThreePointArc((-13.757252439, -11.528463019), (-14.734037631, -11.172244217), (-15.676613793, -10.733437515))
            ThreePointArc((-15.676613793, -10.733437515), (-16.000382579, -12.041618533), (-15.990144217, -13.389230859))
            ThreePointArc((-15.990144217, -13.389230859), (-15.703087752, -13.511738163), (-15.413482434, -13.62809199))
        make_face()
        with BuildLine():
            ThreePointArc((-18.759855783, -11.79013714), (-17.587670094, -11.125197659), (-16.616636492, -10.190715157))
            ThreePointArc((-16.616636492, -10.190715157), (-17.467942324, -9.593823606), (-18.264829452, -8.926012217))
            ThreePointArc((-18.264829452, -8.926012217), (-18.916148245, -10.105820521), (-19.255046482, -11.410163953))
            ThreePointArc((-19.255046482, -11.410163953), (-19.009478453, -11.602792602), (-18.759855783, -11.79013714))
        make_face()
        with BuildLine():
            ThreePointArc((-21.516506507, -9.148703928), (-20.212163074, -8.809805691), (-19.032354771, -8.158486898))
            ThreePointArc((-19.032354771, -8.158486898), (-19.70016616, -7.361599771), (-20.297057711, -6.510293938))
            ThreePointArc((-20.297057711, -6.510293938), (-21.231540213, -7.48132754), (-21.896479694, -8.65351323))
            ThreePointArc((-21.896479694, -8.65351323), (-21.709135156, -8.903135899), (-21.516506507, -9.148703928))
        make_face()
        with BuildLine():
            ThreePointArc((-21.942853375, 2.47620963), (-21.92946485, 2.539366405), (-21.915739337, 2.602450802))
            ThreePointArc((-21.915739337, 2.602450802), (-23.263142697, 2.576605271), (-24.562186363, 2.217928037))
            ThreePointArc((-24.562186363, 2.217928037), (-24.56889027, 2.173784387), (-24.575459377, 2.129620475))
            Line((-24.575459377, 2.129620475), (-21.942853375, 2.47620963))
        make_face()
        with BuildLine():
            ThreePointArc((-23.495573413, -5.883801663), (-22.147961087, -5.894040025), (-20.839780068, -5.57027124))
            ThreePointArc((-20.839780068, -5.57027124), (-20.869365339, -5.512888815), (-20.898643838, -5.455349261))
            Line((-20.898643838, -5.455349261), (-23.531249839, -5.801938416))
            ThreePointArc((-23.531249839, -5.801938416), (-23.513474108, -5.842897269), (-23.495573413, -5.883801663))
        make_face()
    extrude(amount=-CUT_EXTRUDE1_DEPTH, mode=Mode.SUBTRACT)

    # Sketch5 → Cut-Extrude2 (cut, up to next)
    with BuildSketch(Plane(origin=(0, 4, 0), x_dir=(1, 0, 0), z_dir=(0, 1, 0)), mode=Mode.PRIVATE) as cut_extrude2_sk1:
        with Locations((-10.106342554, 0)):
            Circle(SKETCH5_R)
    cut_extrude2_tool1 = extrude(cut_extrude2_sk1.sketch, amount=-CUT_EXTRUDE2_REACH, mode=Mode.PRIVATE) & part.part
    add(cut_extrude2_tool1.solids().sort_by_distance((-10.106343, 4, 0))[0], mode=Mode.SUBTRACT)
    # Sketch5 → Cut-Extrude2 (cut, up to next)
    with BuildSketch(Plane(origin=(0, 4, 0), x_dir=(1, 0, 0), z_dir=(0, 1, 0)), mode=Mode.PRIVATE) as cut_extrude2_sk2:
        with Locations((-14.56784443, -0.587367865)):
            Circle(SKETCH5_R_2)
    cut_extrude2_tool2 = extrude(cut_extrude2_sk2.sketch, amount=-CUT_EXTRUDE2_REACH, mode=Mode.PRIVATE) & part.part
    add(cut_extrude2_tool2.solids().sort_by_distance((-14.567844, 4, 0.587368))[0], mode=Mode.SUBTRACT)
    # Sketch5 → Cut-Extrude2 (cut, up to next)
    with BuildSketch(Plane(origin=(0, 4, 0), x_dir=(1, 0, 0), z_dir=(0, 1, 0)), mode=Mode.PRIVATE) as cut_extrude2_sk3:
        with Locations((-18.533623876, -1.109472634)):
            Circle(SKETCH5_R_2)
    cut_extrude2_tool3 = extrude(cut_extrude2_sk3.sketch, amount=-CUT_EXTRUDE2_REACH, mode=Mode.PRIVATE) & part.part
    add(cut_extrude2_tool3.solids().sort_by_distance((-18.533624, 4, 1.109473))[0], mode=Mode.SUBTRACT)

    # Sketch8 → Boss-Extrude3 (add)
    with BuildSketch(Plane.XZ):
        with BuildLine():
            Line((-30.156718658, 6.674197934), (-40.071167272, 7.979459856))
            ThreePointArc((-40.071167272, 7.979459856), (-44.559051487, 4.53578518), (-41.11537681, 0.047900965))
            Line((-41.11537681, 0.047900965), (-31.200928196, -1.257360957))
            ThreePointArc((-31.200928196, -1.257360957), (-26.713043982, 2.18631372), (-30.156718658, 6.674197934))
        make_face()
        with Locations((-40.593272041, 4.013680411)):
            Circle(SKETCH8_R, mode=Mode.SUBTRACT)
    extrude(amount=BOSS_EXTRUDE3_DEPTH)


solid = part.part
